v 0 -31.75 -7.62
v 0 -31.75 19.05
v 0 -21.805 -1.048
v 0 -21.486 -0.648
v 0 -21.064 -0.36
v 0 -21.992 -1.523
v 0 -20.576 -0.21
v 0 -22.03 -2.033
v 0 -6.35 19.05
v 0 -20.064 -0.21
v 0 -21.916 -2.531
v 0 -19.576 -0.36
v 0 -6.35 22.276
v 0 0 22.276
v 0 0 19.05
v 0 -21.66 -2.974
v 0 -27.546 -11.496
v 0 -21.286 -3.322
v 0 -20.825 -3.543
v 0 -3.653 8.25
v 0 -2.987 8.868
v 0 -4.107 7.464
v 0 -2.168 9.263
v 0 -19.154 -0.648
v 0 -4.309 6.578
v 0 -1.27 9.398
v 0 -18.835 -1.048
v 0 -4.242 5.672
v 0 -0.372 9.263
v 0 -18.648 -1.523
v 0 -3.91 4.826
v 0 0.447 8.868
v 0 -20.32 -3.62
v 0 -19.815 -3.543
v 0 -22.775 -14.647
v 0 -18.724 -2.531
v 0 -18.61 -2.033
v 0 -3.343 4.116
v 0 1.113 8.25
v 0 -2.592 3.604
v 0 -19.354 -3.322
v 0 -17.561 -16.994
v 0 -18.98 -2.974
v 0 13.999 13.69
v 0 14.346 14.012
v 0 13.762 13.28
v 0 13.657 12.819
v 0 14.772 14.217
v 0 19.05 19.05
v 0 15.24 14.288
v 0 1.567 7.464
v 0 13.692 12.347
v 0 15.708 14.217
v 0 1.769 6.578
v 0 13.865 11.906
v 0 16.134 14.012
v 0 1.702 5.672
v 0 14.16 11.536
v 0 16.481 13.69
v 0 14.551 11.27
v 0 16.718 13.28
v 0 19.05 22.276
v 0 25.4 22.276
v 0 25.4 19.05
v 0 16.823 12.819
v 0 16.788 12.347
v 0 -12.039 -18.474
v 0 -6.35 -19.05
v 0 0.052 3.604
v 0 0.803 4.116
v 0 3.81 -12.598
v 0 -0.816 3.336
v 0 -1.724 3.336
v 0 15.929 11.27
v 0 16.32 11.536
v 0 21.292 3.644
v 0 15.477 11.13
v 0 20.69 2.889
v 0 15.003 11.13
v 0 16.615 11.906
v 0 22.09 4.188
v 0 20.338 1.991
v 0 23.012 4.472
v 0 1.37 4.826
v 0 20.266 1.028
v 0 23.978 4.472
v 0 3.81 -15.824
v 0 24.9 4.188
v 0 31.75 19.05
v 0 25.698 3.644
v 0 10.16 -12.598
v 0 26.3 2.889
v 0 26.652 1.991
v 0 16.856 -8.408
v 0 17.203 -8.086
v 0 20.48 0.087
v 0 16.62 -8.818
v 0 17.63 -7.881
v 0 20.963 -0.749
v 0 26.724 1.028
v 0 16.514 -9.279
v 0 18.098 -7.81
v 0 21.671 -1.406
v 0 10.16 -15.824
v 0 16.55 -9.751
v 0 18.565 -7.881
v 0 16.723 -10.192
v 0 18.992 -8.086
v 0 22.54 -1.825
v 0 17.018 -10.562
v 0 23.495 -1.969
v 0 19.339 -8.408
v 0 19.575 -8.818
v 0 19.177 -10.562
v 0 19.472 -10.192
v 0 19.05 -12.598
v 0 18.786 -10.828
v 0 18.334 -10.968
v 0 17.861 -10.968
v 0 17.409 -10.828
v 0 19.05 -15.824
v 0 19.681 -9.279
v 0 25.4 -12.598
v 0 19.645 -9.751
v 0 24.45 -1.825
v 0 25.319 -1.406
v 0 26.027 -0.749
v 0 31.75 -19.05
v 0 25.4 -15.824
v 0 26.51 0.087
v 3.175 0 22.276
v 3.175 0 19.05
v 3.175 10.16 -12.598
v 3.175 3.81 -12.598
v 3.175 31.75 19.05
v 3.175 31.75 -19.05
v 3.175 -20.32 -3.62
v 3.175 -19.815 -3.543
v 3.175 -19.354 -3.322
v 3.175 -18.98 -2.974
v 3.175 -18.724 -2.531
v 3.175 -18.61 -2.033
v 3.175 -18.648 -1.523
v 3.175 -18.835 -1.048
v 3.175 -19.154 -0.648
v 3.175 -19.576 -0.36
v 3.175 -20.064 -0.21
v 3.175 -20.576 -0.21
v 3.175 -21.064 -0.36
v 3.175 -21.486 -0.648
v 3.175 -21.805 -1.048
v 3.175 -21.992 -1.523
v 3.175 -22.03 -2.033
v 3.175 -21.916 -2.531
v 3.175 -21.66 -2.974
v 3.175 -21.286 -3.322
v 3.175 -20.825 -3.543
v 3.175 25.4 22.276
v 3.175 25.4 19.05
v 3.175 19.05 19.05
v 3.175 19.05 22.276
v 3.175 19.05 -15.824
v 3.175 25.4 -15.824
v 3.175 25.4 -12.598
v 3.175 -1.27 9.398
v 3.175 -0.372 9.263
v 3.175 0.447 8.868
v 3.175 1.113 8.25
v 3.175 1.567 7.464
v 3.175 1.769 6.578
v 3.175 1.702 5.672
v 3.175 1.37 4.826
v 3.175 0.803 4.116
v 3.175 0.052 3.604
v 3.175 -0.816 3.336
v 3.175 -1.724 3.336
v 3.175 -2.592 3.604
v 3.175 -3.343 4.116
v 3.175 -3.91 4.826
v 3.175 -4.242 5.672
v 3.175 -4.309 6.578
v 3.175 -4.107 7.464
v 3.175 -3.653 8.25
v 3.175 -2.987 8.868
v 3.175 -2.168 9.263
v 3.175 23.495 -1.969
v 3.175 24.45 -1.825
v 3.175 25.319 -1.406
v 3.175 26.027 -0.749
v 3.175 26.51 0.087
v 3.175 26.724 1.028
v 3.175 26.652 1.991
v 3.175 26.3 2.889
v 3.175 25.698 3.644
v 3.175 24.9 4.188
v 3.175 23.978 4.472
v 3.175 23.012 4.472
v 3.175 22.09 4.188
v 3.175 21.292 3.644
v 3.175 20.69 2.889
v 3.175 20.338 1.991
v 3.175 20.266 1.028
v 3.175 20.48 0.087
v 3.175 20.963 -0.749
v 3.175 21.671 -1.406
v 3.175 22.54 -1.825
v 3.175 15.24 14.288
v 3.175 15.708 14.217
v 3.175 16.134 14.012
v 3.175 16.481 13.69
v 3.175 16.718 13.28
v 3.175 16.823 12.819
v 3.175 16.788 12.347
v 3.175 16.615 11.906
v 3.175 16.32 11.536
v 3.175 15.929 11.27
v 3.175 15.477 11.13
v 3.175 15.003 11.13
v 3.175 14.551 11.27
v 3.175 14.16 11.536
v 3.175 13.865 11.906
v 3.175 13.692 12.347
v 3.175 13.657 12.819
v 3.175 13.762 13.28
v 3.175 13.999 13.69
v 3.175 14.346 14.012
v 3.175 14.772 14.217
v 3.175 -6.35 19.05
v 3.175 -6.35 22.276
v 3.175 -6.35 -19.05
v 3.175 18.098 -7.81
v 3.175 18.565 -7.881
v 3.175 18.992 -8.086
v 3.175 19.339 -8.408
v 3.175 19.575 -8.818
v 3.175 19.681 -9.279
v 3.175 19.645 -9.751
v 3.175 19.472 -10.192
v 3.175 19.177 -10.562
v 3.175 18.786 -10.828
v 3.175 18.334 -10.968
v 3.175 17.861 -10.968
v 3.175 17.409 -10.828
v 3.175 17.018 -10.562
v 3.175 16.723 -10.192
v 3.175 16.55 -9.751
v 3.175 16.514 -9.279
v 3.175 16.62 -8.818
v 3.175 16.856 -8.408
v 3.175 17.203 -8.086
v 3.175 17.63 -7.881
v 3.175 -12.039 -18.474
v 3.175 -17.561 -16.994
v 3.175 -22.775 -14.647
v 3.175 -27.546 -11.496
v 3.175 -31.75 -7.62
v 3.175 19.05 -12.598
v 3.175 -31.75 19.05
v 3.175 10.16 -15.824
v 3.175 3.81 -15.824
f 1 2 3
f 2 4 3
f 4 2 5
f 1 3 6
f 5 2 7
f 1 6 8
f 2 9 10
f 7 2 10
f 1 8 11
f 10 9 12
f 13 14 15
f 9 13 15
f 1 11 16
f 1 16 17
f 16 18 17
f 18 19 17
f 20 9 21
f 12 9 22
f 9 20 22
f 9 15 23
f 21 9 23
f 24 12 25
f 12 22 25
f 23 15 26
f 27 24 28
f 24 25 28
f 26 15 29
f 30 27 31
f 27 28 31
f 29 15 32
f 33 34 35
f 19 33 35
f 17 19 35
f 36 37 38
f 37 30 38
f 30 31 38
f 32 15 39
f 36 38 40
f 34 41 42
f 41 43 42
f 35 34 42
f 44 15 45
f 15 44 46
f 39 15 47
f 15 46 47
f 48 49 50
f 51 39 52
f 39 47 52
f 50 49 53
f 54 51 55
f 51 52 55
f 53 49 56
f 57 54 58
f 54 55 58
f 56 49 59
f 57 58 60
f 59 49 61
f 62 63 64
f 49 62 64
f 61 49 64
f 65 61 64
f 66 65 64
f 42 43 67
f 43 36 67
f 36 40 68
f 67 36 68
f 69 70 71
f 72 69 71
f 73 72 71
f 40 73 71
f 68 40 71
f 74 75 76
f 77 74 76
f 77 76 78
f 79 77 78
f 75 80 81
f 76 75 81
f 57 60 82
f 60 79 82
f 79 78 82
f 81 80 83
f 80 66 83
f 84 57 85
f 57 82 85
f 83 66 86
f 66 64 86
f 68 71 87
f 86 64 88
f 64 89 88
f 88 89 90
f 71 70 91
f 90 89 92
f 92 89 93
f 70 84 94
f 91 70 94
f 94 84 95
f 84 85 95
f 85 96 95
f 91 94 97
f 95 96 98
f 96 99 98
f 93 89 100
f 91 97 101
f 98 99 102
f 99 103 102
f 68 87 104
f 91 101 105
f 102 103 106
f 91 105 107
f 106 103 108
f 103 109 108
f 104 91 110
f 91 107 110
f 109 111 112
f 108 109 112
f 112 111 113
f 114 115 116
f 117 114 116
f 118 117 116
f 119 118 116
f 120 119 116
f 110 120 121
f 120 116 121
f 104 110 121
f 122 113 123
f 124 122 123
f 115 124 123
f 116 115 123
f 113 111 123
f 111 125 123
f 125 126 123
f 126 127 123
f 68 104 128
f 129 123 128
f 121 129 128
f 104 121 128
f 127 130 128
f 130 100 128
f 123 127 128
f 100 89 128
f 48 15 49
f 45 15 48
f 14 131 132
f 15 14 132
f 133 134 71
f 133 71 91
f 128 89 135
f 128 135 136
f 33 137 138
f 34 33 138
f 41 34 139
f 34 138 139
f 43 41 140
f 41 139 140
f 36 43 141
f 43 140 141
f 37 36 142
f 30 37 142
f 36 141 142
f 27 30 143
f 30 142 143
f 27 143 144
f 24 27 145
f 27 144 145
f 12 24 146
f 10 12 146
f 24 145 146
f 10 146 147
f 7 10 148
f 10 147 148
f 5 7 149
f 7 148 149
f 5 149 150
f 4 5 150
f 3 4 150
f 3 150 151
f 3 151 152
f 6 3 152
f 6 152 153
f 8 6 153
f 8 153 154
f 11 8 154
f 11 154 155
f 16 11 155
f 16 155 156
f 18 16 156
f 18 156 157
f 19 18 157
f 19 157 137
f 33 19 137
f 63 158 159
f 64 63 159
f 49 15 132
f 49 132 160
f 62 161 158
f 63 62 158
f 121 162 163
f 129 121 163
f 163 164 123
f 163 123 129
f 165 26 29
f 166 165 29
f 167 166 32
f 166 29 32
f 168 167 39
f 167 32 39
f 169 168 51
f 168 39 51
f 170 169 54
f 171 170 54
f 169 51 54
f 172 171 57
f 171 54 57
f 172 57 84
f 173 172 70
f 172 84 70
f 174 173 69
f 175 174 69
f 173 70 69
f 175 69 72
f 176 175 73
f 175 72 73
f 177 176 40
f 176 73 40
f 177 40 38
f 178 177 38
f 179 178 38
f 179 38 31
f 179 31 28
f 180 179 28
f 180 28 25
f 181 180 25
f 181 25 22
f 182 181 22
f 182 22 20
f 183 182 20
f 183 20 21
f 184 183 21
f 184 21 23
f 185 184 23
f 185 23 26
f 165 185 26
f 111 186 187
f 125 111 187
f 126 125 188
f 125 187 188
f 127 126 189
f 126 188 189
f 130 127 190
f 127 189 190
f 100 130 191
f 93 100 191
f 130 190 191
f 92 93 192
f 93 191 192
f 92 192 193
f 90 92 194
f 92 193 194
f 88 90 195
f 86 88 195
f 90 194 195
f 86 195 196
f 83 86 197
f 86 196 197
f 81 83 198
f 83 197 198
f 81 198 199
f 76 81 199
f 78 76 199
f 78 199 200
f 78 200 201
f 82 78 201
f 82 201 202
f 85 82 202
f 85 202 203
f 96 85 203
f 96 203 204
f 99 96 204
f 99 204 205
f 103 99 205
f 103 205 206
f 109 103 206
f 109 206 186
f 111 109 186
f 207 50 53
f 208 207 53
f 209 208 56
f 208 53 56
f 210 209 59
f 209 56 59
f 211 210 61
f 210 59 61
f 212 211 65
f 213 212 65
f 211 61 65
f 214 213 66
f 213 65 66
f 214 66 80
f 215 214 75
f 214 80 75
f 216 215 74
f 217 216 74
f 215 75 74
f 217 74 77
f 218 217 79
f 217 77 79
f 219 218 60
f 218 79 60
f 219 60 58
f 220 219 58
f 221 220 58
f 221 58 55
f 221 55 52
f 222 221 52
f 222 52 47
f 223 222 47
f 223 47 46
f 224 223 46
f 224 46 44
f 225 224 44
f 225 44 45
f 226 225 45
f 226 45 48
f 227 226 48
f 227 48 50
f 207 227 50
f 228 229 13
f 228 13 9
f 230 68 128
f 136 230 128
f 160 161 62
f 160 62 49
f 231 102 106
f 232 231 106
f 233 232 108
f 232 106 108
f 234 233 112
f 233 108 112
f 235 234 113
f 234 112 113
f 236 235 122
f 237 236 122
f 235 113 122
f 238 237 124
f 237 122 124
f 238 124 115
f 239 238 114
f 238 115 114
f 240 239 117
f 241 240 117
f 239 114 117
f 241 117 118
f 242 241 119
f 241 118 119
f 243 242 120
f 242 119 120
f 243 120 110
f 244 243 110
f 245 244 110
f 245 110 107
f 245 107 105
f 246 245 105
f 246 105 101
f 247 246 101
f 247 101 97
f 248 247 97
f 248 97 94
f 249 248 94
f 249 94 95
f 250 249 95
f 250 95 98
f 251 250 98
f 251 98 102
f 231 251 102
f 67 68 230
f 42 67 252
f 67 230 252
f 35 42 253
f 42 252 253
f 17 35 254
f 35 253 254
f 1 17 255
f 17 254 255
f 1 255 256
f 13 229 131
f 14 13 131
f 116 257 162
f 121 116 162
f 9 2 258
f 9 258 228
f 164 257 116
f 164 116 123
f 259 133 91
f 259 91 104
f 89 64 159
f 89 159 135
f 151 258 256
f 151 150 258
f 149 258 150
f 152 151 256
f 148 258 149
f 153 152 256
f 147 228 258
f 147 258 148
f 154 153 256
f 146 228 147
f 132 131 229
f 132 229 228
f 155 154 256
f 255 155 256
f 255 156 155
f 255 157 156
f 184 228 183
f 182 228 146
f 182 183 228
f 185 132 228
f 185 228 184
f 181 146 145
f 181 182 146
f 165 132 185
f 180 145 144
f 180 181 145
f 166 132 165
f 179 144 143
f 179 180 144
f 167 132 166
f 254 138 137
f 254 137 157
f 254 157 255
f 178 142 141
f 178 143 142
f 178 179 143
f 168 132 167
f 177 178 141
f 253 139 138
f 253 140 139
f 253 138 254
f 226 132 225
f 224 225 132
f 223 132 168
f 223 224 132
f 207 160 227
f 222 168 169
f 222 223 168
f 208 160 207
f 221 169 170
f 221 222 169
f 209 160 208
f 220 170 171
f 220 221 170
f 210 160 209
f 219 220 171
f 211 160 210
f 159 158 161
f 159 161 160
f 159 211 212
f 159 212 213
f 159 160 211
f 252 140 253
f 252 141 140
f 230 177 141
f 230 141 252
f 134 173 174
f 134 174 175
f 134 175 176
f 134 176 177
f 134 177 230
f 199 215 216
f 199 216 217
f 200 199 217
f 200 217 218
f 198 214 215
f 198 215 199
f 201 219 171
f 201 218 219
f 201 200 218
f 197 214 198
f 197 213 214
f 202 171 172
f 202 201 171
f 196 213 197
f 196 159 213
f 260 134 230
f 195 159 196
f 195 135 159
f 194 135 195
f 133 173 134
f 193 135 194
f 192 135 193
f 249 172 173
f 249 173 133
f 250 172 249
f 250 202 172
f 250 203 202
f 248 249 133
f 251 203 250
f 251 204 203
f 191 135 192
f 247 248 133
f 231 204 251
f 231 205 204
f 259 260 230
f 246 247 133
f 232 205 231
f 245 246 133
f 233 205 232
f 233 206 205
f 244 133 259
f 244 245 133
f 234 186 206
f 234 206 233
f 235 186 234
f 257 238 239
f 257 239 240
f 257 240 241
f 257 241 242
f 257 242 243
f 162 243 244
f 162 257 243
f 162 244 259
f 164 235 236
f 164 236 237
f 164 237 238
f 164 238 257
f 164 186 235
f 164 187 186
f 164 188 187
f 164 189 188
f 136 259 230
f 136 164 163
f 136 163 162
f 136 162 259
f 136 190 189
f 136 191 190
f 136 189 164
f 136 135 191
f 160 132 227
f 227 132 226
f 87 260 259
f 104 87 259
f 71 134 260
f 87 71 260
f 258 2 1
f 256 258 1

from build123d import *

# Parameters (mm, degrees)
SKETCH1_W                           = 38.1
SKETCH1_H                           = 63.5
MAIN_BODY_DEPTH                     = 3.175
SKETCH2_W                           = 3.2258
SKETCH2_H                           = 6.35
TABS_DEPTH                          = 3.175
SKETCH5_R                           = 1.7145
MOTOR_CUT_DEPTH                     = 4.175
SKETCH6_R                           = 3.2385
CUT_FOR_AXLE_DEPTH                  = 4.175
ROUND_OFF_BACK_CORNER_DEPTH         = 4.175
SKETCH9_W                           = 3.2258
SKETCH9_H                           = 6.35
CUT_FOR_TABS_DEPTH                  = 4.175
SKETCH10_R                          = 3.048
CUT_FOR_SCREW_ACCESS_DEPTH          = 4.175
SKETCH11_R                          = 1.5875
CUT_FOR_BRACKET_SCREW_DEPTH         = 4.175
SKETCH12_R                          = 1.5875
CUT_FOR_BASIC_TILT_LOCK_SCREW_DEPTH = 4.175


with BuildPart() as part:
    # Sketch1 → main body (new body)
    with BuildSketch(Plane(origin=(0, 0, 0), x_dir=(0, 0, -1), z_dir=(1, 0, 0))):
        Rectangle(SKETCH1_W, SKETCH1_H)
    extrude(amount=MAIN_BODY_DEPTH)

    # Sketch2 → tabs (add)
    with BuildSketch(Plane(origin=(3.175, 0, 0), x_dir=(0, 0, -1), z_dir=(1, 0, 0))):
        with Locations((-20.6629, 22.225)):
            Rectangle(SKETCH2_W, SKETCH2_H)
        with Locations((-20.6629, -3.175)):
            Rectangle(SKETCH2_W, SKETCH2_H)
    extrude(amount=-TABS_DEPTH)

    # Sketch5 → motor cut (cut, through all)
    with BuildSketch(Plane(origin=(3.175, 0, 0), x_dir=(0, 0, -1), z_dir=(1, 0, 0))):
        with Locations((1.905, -20.32)):
            Circle(SKETCH5_R)
    extrude(amount=-MOTOR_CUT_DEPTH, mode=Mode.SUBTRACT)

    # Sketch6 → cut for axle (cut, through all)
    with BuildSketch(Plane(origin=(3.175, 0, 0), x_dir=(0, 0, -1), z_dir=(1, 0, 0))):
        with Locations((-1.27, 23.495)):
            Circle(SKETCH6_R)
    extrude(amount=-CUT_FOR_AXLE_DEPTH, mode=Mode.SUBTRACT)

    # Sketch7 → round off back corner (cut, through all)
    with BuildSketch(Plane(origin=(3.175, 0, 0), x_dir=(0, 0, -1), z_dir=(1, 0, 0))):
        with BuildLine():
            Line((19.05, -31.75), (19.05, -6.35))
            ThreePointArc((19.05, -6.35), (15.925359096, -20.215661593), (7.62, -31.75))
            Line((7.62, -31.75), (19.05, -31.75))
        make_face()
    extrude(amount=-ROUND_OFF_BACK_CORNER_DEPTH, mode=Mode.SUBTRACT)

    # Sketch9 → cut for tabs (cut, through all)
    with BuildSketch(Plane(origin=(3.175, 0, 0), x_dir=(0, 0, -1), z_dir=(1, 0, 0))):
        with Locations((14.2113, 22.225)):
            Rectangle(SKETCH9_W, SKETCH9_H)
        with Locations((14.2113, 6.985)):
            Rectangle(SKETCH9_W, SKETCH9_H)
    extrude(amount=-CUT_FOR_TABS_DEPTH, mode=Mode.SUBTRACT)

    # Sketch10 → cut for screw access (cut, through all)
    with BuildSketch(Plane.ZY):
        with Locations((6.35, -1.27)):
            Circle(SKETCH10_R)
    extrude(amount=-CUT_FOR_SCREW_ACCESS_DEPTH, mode=Mode.SUBTRACT)

    # Sketch11 → cut for bracket screw (cut, through all)
    with BuildSketch(Plane.ZY):
        with Locations((12.7, 15.24)):
            Circle(SKETCH11_R)
    extrude(amount=-CUT_FOR_BRACKET_SCREW_DEPTH, mode=Mode.SUBTRACT)

    # Sketch12 → cut for basic tilt lock screw (cut, through all)
    with BuildSketch(Plane.ZY):
        with Locations((-9.398, 18.0975)):
            Circle(SKETCH12_R)
    extrude(amount=-CUT_FOR_BASIC_TILT_LOCK_SCREW_DEPTH, mode=Mode.SUBTRACT)


solid = part.part
